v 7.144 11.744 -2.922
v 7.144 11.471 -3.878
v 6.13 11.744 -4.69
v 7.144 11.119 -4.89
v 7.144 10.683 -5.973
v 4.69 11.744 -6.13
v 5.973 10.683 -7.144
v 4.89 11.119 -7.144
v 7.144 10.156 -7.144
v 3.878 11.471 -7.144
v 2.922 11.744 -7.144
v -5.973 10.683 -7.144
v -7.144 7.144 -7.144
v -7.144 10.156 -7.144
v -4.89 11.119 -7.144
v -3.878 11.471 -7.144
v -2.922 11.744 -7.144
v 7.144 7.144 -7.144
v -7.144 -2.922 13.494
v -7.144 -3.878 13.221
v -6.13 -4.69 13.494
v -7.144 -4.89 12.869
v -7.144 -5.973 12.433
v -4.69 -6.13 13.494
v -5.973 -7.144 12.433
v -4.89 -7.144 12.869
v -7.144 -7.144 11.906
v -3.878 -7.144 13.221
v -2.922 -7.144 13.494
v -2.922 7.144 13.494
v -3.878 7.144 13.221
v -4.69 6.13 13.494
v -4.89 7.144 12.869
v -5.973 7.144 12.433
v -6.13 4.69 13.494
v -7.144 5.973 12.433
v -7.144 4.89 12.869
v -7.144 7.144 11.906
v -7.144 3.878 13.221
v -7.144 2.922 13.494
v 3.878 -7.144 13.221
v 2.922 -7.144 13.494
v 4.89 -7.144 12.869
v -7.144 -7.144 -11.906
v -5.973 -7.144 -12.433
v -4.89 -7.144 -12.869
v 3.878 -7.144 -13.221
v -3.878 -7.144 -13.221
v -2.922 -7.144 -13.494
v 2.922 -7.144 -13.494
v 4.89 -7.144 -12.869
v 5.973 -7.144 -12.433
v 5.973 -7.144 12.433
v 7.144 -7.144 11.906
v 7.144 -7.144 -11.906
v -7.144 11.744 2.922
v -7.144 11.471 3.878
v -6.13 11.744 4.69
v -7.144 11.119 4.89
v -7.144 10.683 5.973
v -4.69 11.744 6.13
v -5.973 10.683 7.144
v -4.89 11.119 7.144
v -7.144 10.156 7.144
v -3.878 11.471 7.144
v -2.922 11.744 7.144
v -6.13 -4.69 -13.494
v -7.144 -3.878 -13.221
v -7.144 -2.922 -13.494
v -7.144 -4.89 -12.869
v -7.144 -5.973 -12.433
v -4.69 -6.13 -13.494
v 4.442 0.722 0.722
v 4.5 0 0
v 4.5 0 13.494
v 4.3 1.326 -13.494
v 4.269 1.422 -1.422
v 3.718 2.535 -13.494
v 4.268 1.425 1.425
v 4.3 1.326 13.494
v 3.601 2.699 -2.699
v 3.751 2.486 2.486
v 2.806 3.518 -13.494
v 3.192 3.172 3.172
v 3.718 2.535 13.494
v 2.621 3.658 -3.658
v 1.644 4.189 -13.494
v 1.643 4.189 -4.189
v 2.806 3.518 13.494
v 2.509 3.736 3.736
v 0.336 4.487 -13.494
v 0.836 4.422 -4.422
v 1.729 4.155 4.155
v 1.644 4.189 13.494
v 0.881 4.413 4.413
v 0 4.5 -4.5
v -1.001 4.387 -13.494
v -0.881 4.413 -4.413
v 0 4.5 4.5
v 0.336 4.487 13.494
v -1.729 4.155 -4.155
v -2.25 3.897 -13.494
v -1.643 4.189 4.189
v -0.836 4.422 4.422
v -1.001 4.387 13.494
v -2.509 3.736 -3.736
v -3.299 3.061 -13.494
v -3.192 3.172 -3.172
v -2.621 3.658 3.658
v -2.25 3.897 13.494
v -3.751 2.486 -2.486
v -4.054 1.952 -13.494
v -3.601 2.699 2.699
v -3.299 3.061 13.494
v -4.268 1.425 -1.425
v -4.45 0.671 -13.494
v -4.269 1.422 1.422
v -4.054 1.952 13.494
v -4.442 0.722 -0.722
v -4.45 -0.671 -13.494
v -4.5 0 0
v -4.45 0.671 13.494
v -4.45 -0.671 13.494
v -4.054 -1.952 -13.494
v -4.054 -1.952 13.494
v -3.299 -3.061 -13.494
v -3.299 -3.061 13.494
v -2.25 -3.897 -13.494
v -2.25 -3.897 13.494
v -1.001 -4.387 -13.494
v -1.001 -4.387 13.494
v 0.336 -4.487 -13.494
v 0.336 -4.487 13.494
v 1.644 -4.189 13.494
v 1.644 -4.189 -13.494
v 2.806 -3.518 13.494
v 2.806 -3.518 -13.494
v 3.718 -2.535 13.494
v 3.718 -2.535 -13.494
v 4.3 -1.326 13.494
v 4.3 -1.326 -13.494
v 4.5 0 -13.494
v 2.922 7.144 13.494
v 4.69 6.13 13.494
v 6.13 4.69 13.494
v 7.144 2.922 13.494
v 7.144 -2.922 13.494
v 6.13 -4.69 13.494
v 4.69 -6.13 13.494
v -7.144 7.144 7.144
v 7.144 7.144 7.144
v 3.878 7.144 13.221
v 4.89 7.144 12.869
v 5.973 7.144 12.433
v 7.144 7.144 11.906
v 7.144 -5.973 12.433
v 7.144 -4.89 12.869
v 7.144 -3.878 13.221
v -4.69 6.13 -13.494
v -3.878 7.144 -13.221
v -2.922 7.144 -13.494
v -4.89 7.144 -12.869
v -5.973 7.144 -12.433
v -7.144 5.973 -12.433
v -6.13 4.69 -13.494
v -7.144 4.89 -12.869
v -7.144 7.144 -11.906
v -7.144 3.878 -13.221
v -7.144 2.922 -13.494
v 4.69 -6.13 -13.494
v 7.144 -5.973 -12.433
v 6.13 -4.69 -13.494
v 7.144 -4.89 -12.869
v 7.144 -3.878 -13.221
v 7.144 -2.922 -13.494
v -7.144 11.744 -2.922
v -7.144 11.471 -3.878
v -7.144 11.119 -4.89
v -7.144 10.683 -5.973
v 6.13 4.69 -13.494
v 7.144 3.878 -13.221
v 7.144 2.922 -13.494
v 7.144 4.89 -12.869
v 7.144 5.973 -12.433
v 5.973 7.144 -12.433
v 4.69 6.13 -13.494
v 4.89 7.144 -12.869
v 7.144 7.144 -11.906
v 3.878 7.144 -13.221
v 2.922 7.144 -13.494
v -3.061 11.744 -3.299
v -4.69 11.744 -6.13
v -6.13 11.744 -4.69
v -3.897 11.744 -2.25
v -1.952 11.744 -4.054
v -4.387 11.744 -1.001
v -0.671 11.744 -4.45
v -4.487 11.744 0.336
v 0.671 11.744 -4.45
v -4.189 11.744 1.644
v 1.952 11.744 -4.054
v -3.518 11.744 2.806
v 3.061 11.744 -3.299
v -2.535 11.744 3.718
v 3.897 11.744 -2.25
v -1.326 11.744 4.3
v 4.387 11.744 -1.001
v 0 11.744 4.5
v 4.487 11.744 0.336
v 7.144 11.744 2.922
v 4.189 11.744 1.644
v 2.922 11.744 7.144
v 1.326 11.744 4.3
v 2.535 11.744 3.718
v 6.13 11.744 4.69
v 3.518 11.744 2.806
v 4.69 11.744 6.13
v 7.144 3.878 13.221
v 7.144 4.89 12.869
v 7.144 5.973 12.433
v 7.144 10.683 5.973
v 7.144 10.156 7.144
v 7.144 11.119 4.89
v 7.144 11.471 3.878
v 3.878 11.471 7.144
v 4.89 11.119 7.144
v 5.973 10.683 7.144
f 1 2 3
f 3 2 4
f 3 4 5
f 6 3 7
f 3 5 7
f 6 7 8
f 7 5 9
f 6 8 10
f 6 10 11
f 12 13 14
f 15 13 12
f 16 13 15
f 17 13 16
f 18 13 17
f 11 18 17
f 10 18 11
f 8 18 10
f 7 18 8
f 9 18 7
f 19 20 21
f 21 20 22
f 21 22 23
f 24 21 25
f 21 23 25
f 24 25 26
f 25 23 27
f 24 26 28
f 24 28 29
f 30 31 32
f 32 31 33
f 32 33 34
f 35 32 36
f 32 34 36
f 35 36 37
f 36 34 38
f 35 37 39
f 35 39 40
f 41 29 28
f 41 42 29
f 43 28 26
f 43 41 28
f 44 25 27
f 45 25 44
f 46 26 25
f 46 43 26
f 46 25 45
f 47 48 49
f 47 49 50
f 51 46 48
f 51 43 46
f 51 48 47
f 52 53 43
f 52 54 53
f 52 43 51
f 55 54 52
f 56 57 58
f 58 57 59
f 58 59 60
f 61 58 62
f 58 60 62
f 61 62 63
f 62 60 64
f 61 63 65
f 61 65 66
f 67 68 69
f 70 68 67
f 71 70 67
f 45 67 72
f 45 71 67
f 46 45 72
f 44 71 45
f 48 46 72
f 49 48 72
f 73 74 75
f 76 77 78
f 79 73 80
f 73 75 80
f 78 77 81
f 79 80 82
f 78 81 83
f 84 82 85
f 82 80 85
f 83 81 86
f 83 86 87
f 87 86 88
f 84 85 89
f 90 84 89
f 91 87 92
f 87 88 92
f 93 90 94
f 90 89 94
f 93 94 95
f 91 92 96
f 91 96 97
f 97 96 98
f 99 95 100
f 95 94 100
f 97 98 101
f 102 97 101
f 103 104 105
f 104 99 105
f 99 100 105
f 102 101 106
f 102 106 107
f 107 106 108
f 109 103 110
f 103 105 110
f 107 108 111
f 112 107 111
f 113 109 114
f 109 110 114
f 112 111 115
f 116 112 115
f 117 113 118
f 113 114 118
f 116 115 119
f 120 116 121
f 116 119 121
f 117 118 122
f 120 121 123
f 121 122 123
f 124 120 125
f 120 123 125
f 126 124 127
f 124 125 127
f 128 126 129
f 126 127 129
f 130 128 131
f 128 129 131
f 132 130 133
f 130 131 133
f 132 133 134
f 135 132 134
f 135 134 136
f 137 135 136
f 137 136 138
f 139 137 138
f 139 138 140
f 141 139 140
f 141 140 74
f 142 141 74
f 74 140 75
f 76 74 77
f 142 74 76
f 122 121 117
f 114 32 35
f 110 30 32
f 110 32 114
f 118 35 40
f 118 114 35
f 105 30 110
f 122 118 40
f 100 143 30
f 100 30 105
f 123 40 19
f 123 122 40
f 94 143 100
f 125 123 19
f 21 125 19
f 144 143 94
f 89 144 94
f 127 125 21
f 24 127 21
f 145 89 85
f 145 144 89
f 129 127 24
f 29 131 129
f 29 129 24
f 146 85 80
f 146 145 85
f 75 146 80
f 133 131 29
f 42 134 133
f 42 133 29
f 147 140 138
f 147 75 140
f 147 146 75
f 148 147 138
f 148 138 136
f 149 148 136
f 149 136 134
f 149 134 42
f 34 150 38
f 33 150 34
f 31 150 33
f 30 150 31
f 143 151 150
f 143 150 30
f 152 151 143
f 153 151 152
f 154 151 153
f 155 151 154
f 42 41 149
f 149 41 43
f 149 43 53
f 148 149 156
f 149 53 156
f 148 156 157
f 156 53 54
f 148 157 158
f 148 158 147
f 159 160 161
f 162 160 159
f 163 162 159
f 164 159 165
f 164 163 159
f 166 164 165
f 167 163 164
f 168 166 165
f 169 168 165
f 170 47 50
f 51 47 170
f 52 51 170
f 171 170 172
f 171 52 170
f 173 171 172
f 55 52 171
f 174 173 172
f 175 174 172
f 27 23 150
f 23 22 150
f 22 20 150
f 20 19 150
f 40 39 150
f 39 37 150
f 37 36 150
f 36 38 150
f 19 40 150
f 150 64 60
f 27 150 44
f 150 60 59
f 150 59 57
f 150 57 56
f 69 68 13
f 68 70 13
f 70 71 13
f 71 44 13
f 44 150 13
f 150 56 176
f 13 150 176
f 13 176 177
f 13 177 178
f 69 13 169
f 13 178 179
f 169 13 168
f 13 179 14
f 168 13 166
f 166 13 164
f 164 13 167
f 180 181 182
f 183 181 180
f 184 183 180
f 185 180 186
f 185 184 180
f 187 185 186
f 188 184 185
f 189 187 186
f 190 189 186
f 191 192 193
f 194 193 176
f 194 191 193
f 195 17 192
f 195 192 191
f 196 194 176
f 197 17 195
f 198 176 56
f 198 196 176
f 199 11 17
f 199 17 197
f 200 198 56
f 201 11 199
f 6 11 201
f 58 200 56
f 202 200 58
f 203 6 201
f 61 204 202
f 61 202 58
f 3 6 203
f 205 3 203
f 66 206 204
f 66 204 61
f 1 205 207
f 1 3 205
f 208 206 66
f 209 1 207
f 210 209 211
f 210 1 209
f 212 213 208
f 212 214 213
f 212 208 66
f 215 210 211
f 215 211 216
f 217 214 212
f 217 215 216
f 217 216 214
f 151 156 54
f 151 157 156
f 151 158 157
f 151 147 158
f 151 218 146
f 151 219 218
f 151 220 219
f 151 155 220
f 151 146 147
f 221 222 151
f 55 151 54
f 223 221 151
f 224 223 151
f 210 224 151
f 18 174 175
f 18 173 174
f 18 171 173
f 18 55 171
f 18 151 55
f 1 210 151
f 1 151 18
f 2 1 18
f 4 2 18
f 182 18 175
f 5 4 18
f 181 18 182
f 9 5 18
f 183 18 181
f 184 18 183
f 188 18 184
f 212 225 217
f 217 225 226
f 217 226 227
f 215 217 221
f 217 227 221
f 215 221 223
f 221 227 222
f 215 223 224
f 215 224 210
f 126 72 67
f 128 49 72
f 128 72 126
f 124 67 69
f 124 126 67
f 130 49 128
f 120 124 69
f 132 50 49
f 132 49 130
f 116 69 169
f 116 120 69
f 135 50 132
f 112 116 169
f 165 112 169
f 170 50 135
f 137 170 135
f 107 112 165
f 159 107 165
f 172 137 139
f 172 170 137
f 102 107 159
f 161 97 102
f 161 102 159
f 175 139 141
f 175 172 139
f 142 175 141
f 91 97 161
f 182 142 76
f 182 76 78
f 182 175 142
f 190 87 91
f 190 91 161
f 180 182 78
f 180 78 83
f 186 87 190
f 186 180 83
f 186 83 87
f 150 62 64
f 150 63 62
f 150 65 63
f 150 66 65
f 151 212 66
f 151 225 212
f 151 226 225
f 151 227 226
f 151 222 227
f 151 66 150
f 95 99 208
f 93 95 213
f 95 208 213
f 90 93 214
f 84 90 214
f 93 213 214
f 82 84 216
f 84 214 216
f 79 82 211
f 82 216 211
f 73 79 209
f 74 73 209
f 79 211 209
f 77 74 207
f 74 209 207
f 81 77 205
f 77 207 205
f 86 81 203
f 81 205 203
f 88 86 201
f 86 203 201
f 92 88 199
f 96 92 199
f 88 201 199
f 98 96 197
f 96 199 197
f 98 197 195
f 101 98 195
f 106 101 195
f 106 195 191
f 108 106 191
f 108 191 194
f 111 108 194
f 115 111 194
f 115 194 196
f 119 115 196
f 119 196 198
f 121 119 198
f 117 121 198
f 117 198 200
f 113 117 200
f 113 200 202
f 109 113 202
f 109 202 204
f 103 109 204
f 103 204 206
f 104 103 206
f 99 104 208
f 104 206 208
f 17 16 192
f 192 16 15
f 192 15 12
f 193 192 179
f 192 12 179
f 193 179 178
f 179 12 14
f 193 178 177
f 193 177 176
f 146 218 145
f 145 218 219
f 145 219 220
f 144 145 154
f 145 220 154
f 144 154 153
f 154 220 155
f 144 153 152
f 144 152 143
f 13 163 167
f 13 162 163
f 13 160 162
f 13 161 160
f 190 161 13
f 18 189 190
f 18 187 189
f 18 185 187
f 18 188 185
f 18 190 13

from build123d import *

# Parameters (mm, degrees)
BOSS_EXTRUDE1_DEPTH     = 7.14375
SKETCH2_R               = 4.5
CUT_EXTRUDE1_DEPTH      = 31.286531402
CUT_EXTRUDE2_REACH      = 26.287
CUT_EXTRUDE2_END_RADIUS = 4.5
SKETCH3_R               = 4.5


with BuildPart() as part:
    # Sketch1 → Boss-Extrude1 (new, symmetric)
    with BuildSketch(Plane(origin=(0, 0, 0), x_dir=(0, 0, -1), z_dir=(1, 0, 0))):
        Polygon((-13.49375, -7.14375), (13.49375, -7.14375), (13.49375, 7.14375), (7.14375, 7.14375), (7.14375, 11.74375), (-7.14375, 11.74375), (-7.14375, 7.14375), (-13.49375, 7.14375), align=None)
    extrude(amount=BOSS_EXTRUDE1_DEPTH, both=True)

    # Sketch2 → Cut-Extrude1 (cut, through all)
    with BuildSketch(Plane.XY.offset(13.49375)):
        Circle(SKETCH2_R)
    extrude(amount=-CUT_EXTRUDE1_DEPTH, mode=Mode.SUBTRACT)

    # Cut-Extrude2: up to this cylinder (the profile starts outside it)
    cut_extrude2_end = Plane(origin=(0, 0, 0), z_dir=(0, 0, 1)) * Cylinder(CUT_EXTRUDE2_END_RADIUS, 62.574, mode=Mode.PRIVATE)
    # Sketch3 → Cut-Extrude2 (cut, up to the surface)
    with BuildSketch(Plane(origin=(0, 11.74375, 0), x_dir=(1, 0, 0), z_dir=(0, 1, 0)), mode=Mode.PRIVATE) as cut_extrude2_sk1:
        with Locations(Location((0, 0, 0), (0, 0, 270))):
            Circle(SKETCH3_R)
    cut_extrude2_tool1 = extrude(cut_extrude2_sk1.sketch, amount=-CUT_EXTRUDE2_REACH, mode=Mode.PRIVATE) - cut_extrude2_end
    add(cut_extrude2_tool1.solids().sort_by_distance((0, 11.74375, 0))[0], mode=Mode.SUBTRACT)

    # Sketch4 → Cut-Revolve1 (revolve, cut)
    with BuildSketch(Plane(origin=(0, 0, 0), x_dir=(0, 0, -1), z_dir=(0.7071067811865476, 0.7071067811865475, 0))):
        Polygon((13.49375, 10.102788136), (13.99375, 6.967405384), (11.90625, 10.102788136), align=None)
        Polygon((-13.49375, 10.102788136), (-13.99375, 6.967405384), (-11.90625, 10.102788136), align=None)
    revolve(axis=Axis((0, 0, -13.49375), (0, 0, 1)), mode=Mode.SUBTRACT)

    # Sketch5 → Cut-Revolve2 (revolve, cut)
    with BuildSketch(Plane(origin=(0, 0, 0), x_dir=(-0.7071067811865476, 0, -0.7071067811865475), z_dir=(0.7071067811865475, 0, -0.7071067811865476))):
        Polygon((10.102788136, 11.74375), (6.967405384, 12.24375), (10.102788136, 10.15625), align=None)
    revolve(axis=Axis((0, 0, 0), (0, 1, 0)), mode=Mode.SUBTRACT)


solid = part.part
